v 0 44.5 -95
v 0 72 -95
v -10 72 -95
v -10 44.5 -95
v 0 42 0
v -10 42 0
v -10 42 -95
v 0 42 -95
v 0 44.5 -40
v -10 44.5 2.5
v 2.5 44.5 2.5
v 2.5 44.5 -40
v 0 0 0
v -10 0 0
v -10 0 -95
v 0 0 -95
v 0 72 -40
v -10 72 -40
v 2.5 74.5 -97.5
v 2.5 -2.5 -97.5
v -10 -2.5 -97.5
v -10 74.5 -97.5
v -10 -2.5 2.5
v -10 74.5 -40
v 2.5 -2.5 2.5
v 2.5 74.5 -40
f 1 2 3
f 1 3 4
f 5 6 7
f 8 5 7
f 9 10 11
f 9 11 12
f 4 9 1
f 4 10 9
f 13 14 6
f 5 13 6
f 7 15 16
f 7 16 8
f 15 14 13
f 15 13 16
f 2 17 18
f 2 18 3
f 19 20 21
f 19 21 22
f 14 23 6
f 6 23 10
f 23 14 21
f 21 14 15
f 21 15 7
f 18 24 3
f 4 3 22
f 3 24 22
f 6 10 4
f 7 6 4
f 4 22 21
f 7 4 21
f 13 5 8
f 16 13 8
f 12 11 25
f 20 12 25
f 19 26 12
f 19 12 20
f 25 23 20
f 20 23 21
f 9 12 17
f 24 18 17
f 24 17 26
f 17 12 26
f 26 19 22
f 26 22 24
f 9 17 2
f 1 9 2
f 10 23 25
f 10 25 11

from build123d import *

# Parameters (mm, degrees)
SKETCH1_W                = 95
SKETCH1_H                = 42
BOSS_EXTRUDE2_DEPTH      = 2.5
EXTRUDE_THIN1_DEPTH      = 2.5
EXTRUDE_THIN1_DEPTH_BACK = 10
SKETCH1_2_W              = 100
SKETCH1_2_H              = 47
SKETCH1_2_W_2            = 95
SKETCH1_2_H_2            = 42
BOSS_EXTRUDE3_DEPTH      = 12.5
SKETCH2_4_W              = 55
SKETCH2_4_H              = 27.5
BOSS_EXTRUDE4_DEPTH      = 2.5


with BuildPart() as part:
    # Sketch1 → Boss-Extrude2 (new body)
    with BuildSketch(Plane(origin=(0, 0, 0), x_dir=(0, 0, -1), z_dir=(1, 0, 0))):
        with Locations((47.5, 21)):
            Rectangle(SKETCH1_W, SKETCH1_H)
    extrude(amount=BOSS_EXTRUDE2_DEPTH)

    # Sketch1<2> → Extrude-Thin1 (add, two sides: drawn at the far end of the back side and taken through both)
    with BuildSketch(Plane(origin=(0, 0, 0), x_dir=(0, 0, -1), z_dir=(1, 0, 0)).offset(-EXTRUDE_THIN1_DEPTH_BACK)):
        with Locations((47.5, 21)):
            Rectangle(SKETCH1_2_W, SKETCH1_2_H)
        with Locations((47.5, 21)):
            Rectangle(SKETCH1_2_W_2, SKETCH1_2_H_2, mode=Mode.SUBTRACT)
    extrude(amount=EXTRUDE_THIN1_DEPTH + EXTRUDE_THIN1_DEPTH_BACK)

    # Sketch2 → Boss-Extrude3 (add)
    with BuildSketch(Plane(origin=(2.5, 0, 0), x_dir=(0, 0, -1), z_dir=(1, 0, 0))):
        Polygon((95, 44.5), (97.5, 44.5), (97.5, 74.5), (40, 74.5), (40, 72), (95, 72), align=None)
    extrude(amount=-BOSS_EXTRUDE3_DEPTH)

    # Sketch2<4> → Boss-Extrude4 (add)
    with BuildSketch(Plane(origin=(2.5, 0, 0), x_dir=(0, 0, -1), z_dir=(1, 0, 0))):
        with Locations((67.5, 58.25)):
            Rectangle(SKETCH2_4_W, SKETCH2_4_H)
    extrude(amount=-BOSS_EXTRUDE4_DEPTH)


solid = part.part
